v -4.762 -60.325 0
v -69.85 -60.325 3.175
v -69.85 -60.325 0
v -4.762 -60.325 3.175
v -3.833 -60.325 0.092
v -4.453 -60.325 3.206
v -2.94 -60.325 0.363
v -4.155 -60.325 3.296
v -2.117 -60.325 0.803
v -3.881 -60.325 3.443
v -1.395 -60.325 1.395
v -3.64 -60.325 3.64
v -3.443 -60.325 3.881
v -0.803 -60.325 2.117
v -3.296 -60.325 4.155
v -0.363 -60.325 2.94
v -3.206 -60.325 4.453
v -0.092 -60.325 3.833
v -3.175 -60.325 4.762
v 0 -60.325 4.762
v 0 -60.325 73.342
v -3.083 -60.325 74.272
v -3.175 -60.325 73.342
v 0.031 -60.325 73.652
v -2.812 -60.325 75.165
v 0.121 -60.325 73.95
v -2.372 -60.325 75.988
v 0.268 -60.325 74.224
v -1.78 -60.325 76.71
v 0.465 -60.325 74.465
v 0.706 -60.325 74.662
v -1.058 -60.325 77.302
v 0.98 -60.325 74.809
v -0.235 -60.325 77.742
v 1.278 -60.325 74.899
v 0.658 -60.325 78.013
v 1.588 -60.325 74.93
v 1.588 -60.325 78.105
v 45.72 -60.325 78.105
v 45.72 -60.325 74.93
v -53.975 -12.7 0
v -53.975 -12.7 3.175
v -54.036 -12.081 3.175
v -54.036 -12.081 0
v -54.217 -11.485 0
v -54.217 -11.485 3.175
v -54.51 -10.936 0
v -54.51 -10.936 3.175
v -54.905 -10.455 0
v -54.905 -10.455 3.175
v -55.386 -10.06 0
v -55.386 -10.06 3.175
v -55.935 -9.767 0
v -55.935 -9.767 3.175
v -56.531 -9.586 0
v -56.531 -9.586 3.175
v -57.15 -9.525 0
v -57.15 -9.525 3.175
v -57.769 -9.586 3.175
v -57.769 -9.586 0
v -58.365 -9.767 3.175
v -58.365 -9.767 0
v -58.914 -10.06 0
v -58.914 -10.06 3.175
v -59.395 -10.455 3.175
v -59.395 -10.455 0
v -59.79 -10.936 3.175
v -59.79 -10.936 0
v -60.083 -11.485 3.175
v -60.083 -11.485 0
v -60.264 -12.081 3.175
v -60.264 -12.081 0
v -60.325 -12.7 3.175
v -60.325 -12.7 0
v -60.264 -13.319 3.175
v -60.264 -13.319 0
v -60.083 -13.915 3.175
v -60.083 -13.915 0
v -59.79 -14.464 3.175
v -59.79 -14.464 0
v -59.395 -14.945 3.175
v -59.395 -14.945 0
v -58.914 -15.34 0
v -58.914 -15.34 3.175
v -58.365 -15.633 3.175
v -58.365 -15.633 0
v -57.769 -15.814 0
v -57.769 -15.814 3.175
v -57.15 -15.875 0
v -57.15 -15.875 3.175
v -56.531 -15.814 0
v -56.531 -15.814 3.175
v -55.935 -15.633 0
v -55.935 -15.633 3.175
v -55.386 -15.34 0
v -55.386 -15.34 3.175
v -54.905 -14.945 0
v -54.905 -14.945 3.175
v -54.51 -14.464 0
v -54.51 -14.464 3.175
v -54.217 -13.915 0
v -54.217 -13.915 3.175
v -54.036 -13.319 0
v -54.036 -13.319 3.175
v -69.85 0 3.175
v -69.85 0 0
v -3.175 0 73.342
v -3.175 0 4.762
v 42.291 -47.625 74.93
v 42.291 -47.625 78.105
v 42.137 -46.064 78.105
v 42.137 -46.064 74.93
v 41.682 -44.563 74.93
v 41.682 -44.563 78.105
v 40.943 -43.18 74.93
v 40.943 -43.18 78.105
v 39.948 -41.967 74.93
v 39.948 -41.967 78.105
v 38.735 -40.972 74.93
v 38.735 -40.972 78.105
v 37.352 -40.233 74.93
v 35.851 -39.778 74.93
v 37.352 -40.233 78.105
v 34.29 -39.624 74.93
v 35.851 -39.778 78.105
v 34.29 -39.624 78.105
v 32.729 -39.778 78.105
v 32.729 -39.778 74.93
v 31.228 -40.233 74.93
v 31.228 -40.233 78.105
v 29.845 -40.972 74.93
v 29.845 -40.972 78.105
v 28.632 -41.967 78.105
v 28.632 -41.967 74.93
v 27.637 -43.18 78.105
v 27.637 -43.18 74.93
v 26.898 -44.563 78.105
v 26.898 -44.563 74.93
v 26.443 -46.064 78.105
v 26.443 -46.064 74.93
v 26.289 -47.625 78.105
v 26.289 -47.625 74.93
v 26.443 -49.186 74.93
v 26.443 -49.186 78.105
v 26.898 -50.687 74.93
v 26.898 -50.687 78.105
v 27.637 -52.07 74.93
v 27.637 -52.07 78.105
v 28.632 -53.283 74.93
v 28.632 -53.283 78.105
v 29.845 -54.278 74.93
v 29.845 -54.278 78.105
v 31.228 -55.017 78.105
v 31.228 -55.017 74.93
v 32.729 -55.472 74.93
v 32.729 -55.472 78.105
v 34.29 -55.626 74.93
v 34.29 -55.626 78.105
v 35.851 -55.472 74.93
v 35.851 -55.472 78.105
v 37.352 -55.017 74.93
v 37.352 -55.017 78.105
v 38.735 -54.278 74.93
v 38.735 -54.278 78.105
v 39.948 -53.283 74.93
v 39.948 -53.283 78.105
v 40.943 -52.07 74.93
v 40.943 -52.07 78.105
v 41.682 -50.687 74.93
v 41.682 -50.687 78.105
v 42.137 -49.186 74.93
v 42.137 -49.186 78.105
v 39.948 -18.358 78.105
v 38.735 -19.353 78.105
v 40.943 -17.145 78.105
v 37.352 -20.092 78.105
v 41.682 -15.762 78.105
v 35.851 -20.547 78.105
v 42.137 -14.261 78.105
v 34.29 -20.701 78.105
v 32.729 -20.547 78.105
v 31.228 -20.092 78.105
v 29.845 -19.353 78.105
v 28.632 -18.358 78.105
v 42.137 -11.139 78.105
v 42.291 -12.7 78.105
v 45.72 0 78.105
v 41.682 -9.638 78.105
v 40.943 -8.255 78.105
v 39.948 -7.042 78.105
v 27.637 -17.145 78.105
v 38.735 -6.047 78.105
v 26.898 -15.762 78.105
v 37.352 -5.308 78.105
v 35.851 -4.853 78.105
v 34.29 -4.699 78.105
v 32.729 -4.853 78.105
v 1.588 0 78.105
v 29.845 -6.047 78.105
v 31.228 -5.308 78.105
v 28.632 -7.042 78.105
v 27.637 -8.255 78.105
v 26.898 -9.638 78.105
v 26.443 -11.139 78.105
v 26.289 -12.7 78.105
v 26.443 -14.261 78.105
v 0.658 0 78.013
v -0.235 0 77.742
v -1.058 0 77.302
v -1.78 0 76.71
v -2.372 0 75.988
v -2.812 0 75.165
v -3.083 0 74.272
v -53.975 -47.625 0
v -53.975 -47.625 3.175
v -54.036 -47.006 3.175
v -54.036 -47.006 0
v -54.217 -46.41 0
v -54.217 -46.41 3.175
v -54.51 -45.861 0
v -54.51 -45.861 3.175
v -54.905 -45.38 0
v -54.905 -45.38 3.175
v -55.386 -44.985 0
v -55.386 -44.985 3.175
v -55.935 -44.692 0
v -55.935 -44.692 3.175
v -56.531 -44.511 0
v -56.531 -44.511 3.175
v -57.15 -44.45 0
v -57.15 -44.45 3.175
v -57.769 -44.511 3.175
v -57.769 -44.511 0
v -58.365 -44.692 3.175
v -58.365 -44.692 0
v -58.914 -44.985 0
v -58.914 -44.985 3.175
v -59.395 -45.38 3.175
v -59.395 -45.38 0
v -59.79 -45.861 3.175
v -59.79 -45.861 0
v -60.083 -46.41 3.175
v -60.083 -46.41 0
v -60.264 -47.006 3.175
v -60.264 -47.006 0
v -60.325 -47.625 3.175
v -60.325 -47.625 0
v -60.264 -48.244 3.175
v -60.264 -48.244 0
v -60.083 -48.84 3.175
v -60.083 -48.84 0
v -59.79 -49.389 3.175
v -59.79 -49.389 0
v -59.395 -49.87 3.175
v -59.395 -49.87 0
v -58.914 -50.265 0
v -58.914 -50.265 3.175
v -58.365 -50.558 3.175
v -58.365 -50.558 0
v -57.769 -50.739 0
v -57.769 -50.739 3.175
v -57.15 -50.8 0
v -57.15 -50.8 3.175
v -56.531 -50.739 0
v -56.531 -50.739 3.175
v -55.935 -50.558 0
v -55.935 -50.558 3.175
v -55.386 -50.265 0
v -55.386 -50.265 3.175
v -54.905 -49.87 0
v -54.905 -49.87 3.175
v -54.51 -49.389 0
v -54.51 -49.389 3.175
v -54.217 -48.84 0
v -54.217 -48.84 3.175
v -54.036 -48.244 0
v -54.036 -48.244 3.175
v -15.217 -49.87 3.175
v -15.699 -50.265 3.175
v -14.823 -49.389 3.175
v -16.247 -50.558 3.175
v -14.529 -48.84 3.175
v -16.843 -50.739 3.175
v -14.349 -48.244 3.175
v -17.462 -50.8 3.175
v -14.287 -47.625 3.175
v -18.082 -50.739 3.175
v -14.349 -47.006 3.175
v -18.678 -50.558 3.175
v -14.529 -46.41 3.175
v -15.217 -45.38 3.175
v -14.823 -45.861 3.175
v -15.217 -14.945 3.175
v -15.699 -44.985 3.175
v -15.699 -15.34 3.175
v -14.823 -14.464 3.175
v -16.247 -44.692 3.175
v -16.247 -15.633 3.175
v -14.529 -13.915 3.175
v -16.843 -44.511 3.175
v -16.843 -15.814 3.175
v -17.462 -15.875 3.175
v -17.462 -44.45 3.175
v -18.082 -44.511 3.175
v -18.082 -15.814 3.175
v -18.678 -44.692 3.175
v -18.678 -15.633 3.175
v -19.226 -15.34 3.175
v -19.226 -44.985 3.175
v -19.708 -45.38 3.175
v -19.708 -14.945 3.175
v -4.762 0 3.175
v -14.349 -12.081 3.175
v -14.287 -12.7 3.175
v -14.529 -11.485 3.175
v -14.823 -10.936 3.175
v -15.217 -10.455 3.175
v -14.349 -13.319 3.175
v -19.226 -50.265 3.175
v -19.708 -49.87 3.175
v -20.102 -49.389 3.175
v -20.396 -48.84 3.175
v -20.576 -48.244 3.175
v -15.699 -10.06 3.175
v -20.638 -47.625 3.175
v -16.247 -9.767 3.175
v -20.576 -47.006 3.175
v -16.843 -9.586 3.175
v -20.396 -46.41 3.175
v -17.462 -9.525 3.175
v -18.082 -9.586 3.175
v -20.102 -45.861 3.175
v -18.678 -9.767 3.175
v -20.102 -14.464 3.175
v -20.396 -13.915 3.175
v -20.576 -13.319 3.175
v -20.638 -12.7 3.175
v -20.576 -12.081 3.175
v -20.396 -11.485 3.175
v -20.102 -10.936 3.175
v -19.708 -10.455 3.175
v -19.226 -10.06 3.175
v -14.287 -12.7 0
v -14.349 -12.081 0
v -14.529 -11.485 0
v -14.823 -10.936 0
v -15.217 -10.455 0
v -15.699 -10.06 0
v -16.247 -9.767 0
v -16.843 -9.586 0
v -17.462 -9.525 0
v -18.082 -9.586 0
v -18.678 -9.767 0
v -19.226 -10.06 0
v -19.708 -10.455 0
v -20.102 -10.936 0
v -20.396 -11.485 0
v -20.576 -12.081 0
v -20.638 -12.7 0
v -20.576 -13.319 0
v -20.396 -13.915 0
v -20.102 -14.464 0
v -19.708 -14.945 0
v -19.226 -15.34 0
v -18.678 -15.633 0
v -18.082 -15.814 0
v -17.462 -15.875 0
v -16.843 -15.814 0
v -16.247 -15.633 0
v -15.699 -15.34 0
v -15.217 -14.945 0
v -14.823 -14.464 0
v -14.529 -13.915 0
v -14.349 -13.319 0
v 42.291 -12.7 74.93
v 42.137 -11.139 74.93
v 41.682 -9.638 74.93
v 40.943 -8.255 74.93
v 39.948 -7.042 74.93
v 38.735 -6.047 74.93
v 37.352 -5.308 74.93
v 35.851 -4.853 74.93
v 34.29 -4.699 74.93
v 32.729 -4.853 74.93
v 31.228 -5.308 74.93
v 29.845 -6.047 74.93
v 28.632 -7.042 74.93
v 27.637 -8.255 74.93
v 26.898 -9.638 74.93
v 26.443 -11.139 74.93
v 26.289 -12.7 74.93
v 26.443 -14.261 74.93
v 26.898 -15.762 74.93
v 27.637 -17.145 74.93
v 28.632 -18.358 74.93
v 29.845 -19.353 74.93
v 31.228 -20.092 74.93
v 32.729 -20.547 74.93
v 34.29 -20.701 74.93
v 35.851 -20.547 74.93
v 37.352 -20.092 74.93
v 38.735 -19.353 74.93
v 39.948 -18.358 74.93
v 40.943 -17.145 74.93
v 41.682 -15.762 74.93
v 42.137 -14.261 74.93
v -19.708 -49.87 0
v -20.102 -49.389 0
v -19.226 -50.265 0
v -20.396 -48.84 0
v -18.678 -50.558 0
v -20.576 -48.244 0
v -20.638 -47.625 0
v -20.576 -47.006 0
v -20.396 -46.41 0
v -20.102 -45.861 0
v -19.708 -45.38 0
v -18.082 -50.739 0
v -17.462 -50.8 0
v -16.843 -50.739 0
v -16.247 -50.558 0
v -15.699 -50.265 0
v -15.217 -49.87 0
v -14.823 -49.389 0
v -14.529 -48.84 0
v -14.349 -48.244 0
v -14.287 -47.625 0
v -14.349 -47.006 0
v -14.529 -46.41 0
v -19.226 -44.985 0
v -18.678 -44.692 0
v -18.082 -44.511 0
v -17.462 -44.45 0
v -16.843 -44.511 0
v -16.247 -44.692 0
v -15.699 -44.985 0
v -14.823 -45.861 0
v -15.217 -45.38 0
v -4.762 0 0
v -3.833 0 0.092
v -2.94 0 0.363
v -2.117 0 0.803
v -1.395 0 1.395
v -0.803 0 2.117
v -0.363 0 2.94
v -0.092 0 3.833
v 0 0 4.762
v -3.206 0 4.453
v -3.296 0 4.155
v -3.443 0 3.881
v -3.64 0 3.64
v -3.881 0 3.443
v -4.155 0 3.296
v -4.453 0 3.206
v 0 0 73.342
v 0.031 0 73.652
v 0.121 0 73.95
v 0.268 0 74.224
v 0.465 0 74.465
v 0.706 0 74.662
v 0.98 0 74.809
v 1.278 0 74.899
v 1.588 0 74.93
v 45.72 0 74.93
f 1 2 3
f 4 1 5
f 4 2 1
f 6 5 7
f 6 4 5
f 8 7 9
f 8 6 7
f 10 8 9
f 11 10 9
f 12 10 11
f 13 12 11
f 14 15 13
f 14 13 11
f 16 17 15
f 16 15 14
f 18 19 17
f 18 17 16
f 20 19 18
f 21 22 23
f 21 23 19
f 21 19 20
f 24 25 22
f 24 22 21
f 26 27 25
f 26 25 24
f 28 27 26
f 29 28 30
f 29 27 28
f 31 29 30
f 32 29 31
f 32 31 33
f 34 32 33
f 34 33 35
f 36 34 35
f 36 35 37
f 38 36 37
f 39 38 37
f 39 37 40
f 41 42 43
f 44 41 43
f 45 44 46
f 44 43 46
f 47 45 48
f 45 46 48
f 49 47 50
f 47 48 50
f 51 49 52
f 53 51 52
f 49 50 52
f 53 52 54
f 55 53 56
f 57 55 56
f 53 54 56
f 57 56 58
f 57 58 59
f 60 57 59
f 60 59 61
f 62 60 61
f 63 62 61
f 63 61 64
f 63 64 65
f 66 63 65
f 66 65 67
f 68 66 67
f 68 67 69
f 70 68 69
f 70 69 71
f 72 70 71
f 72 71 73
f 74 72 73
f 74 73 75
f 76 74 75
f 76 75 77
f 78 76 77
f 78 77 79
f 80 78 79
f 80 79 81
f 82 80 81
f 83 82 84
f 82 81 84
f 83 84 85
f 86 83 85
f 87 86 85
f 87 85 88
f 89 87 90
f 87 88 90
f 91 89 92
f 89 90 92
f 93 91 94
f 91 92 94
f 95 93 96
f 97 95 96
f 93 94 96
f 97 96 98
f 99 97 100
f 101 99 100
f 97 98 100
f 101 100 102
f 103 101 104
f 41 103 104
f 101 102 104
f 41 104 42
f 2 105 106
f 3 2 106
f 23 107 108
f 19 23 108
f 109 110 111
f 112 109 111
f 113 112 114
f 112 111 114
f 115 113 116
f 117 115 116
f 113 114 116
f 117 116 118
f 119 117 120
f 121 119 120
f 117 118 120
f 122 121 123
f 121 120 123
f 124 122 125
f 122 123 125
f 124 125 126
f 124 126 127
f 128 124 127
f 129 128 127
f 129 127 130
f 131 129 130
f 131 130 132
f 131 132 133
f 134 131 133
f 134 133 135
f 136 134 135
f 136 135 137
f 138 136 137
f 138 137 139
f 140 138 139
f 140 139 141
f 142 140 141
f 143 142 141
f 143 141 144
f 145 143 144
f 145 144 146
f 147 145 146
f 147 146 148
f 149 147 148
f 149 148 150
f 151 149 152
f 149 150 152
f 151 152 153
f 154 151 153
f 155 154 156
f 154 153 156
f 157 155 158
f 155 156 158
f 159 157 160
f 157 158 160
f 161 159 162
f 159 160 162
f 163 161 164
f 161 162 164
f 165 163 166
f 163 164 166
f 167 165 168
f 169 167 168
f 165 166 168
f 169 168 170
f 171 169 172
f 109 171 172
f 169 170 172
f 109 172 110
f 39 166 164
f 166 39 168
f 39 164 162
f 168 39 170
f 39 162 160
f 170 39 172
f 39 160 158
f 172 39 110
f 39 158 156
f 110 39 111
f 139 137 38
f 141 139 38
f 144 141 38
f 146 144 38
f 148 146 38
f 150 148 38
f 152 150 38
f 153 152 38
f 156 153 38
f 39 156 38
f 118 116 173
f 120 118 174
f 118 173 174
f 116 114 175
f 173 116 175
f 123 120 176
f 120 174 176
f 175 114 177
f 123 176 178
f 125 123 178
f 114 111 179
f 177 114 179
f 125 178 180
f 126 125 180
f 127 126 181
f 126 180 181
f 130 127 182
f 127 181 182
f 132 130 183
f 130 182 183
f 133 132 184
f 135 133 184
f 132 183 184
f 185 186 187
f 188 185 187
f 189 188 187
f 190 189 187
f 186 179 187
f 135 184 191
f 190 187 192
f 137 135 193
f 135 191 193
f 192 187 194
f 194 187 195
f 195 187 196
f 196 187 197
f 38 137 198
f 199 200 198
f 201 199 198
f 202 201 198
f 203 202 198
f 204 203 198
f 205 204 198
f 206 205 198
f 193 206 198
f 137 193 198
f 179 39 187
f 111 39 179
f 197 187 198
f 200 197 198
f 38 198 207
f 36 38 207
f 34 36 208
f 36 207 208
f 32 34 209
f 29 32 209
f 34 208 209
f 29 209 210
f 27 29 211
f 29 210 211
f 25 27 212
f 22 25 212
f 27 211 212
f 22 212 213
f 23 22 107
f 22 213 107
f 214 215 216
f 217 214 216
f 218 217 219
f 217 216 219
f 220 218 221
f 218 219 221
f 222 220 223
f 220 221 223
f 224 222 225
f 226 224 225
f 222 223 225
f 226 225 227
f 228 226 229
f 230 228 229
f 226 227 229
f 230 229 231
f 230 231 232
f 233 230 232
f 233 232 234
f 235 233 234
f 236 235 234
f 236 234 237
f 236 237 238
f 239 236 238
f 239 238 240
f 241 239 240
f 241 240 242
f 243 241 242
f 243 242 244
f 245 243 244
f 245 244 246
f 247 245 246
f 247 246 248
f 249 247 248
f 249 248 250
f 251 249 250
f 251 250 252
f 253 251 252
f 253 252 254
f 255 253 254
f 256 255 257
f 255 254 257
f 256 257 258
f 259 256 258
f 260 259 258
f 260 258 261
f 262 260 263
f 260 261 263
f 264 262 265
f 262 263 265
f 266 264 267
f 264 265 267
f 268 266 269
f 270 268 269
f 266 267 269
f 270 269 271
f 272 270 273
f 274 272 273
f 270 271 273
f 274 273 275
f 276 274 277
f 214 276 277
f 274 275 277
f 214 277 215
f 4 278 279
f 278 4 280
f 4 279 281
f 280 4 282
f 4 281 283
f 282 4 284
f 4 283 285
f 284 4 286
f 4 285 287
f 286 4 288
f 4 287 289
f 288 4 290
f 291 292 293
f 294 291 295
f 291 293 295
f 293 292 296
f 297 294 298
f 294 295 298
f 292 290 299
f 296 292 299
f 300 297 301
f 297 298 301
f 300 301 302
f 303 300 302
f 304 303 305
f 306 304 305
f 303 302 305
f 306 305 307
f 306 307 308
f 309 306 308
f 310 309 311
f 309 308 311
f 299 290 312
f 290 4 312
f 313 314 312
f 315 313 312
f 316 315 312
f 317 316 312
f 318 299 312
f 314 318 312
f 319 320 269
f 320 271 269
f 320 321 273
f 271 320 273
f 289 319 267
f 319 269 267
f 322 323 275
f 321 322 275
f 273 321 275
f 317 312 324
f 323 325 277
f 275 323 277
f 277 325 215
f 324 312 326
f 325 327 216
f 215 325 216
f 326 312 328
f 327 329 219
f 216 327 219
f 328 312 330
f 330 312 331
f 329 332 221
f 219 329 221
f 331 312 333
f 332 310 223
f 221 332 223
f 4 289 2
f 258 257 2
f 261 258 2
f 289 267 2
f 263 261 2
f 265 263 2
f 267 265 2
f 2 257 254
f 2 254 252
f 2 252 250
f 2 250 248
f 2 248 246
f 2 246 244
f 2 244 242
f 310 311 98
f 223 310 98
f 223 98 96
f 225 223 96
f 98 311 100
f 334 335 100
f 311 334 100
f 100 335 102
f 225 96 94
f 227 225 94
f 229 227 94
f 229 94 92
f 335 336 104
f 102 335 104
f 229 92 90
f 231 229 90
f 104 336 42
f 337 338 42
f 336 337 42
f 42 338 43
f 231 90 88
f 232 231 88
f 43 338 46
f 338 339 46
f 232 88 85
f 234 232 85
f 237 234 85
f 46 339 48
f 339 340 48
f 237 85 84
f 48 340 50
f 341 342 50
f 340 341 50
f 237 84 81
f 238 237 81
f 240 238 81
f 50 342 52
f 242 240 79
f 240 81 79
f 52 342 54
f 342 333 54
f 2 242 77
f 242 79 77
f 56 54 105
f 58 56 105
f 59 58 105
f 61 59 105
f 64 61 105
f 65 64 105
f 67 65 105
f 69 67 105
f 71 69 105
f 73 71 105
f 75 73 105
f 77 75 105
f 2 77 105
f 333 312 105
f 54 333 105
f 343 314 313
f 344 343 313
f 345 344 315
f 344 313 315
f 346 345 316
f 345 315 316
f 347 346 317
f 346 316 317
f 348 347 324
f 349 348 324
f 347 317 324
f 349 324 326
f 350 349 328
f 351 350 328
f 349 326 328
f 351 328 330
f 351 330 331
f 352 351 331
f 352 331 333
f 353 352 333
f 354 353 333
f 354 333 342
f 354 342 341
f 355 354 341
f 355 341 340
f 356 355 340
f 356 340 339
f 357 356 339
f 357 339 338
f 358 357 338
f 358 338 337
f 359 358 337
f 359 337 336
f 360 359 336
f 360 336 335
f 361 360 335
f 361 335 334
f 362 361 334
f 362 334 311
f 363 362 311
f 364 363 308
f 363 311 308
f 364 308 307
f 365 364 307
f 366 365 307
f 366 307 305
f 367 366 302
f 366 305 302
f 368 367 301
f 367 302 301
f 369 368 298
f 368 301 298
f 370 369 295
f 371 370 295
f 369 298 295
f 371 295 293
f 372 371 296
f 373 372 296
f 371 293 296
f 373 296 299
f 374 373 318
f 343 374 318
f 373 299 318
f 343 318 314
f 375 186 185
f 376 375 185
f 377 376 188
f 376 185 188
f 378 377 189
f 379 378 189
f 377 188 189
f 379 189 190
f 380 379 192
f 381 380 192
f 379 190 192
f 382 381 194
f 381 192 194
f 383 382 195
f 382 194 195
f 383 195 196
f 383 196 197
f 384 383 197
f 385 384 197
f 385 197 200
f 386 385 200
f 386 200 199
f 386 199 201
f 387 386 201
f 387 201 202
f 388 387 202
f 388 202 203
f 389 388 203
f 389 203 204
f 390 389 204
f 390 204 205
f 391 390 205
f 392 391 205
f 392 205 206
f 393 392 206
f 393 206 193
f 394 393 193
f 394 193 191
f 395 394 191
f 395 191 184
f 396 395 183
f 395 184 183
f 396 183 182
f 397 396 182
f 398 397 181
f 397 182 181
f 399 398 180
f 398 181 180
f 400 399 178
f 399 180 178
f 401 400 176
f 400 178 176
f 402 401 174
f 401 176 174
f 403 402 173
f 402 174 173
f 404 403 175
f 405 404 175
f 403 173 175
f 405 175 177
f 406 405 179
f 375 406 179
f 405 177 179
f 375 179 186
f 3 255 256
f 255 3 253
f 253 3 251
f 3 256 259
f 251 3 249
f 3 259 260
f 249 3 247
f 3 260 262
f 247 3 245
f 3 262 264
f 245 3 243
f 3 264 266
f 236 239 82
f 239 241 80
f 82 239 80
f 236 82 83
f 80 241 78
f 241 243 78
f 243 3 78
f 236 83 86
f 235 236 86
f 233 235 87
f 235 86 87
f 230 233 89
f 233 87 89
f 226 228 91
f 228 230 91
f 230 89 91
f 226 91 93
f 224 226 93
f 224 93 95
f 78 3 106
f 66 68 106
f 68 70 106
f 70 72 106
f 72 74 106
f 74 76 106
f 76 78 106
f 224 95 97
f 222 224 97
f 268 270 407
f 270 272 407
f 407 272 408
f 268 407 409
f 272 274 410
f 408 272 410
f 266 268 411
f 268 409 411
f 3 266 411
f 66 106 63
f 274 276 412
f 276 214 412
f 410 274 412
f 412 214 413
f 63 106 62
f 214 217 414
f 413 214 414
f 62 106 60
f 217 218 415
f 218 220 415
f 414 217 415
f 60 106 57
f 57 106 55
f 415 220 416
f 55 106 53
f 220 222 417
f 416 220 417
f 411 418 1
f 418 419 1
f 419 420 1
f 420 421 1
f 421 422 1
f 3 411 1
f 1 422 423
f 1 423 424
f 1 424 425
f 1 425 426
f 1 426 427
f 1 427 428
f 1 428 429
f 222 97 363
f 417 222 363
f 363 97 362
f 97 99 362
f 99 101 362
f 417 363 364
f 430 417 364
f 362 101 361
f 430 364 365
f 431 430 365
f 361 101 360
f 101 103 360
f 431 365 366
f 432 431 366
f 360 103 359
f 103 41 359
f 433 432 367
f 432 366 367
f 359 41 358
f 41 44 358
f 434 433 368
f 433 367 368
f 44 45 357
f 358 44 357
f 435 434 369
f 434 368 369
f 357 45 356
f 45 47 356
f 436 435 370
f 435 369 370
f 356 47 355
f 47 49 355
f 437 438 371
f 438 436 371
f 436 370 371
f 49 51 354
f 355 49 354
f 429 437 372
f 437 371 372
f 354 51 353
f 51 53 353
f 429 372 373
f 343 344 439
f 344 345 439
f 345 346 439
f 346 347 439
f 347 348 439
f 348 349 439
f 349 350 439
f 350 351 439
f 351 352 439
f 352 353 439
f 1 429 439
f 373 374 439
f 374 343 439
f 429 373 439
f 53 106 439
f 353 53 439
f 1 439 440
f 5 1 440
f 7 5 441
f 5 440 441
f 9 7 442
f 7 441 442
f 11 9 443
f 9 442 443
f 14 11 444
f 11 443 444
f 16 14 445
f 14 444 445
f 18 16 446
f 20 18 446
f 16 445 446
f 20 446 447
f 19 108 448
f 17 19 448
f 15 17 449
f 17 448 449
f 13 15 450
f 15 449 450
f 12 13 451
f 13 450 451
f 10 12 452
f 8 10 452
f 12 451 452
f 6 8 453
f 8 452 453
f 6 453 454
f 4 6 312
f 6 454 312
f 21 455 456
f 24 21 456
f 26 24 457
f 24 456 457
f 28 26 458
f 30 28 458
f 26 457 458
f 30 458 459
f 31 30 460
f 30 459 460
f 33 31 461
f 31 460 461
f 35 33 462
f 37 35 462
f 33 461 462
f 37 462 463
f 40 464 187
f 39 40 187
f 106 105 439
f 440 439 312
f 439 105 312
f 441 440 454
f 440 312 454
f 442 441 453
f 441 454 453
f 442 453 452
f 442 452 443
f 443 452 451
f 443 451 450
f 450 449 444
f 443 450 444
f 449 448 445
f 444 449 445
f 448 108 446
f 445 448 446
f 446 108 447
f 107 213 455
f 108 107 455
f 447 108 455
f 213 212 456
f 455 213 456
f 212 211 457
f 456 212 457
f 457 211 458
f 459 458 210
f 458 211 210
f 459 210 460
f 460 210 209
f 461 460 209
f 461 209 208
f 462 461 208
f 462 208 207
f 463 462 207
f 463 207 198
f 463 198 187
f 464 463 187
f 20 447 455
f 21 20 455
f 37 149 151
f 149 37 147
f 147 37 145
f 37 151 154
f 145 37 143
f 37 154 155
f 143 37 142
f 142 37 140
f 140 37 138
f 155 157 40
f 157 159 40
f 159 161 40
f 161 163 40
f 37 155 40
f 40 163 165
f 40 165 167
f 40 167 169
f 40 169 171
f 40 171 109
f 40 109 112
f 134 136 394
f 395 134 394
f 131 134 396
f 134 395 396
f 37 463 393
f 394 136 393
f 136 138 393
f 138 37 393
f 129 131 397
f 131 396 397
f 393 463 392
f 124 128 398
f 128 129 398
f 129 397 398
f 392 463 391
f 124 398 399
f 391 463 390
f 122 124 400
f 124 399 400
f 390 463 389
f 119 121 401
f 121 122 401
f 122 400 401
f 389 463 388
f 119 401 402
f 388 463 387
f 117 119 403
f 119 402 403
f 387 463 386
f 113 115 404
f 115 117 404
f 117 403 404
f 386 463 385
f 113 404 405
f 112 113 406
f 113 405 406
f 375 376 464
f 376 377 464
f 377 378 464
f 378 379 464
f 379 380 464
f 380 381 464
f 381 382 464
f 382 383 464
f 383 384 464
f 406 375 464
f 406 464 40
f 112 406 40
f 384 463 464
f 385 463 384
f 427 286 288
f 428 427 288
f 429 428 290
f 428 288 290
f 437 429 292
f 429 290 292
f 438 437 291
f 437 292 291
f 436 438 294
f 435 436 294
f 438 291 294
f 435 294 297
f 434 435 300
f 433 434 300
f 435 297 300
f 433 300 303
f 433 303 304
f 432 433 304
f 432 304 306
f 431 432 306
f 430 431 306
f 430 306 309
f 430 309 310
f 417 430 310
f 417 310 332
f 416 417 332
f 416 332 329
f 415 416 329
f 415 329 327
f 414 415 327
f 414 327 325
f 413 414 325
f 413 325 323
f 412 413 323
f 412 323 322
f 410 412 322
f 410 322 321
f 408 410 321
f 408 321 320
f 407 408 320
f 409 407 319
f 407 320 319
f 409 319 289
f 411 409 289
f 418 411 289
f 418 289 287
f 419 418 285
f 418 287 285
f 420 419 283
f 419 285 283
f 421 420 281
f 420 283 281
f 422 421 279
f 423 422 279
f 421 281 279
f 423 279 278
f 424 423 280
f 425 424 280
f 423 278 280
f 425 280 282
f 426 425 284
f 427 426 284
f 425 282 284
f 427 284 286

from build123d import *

# Parameters (mm, degrees)
F1_DEPTH = 60.325
F2_R     = 8.001
F3_DEPTH = 25.4
F4_R     = 3.175
F5_DEPTH = 25.4


with BuildPart() as f1:
    # F0 (on Front) → F1 (new body)
    with BuildSketch(Plane.XZ):
        with BuildLine():
            Line((-4.7625, 3.175), (-69.85, 3.175))
            Line((-69.85, 3.175), (-69.85, 0))
            Line((-69.85, 0), (-4.7625, 0))
            ThreePointArc((-4.7625, 0), (-1.394904, 1.394904), (0, 4.7625))
            Line((0, 4.7625), (0, 73.3425))
            ThreePointArc((0, 73.3425), (0.464968, 74.465032), (1.5875, 74.93))
            Line((1.5875, 74.93), (45.72, 74.93))
            Line((45.72, 74.93), (45.72, 78.105))
            Line((45.72, 78.105), (1.5875, 78.105))
            ThreePointArc((1.5875, 78.105), (-1.780096, 76.710096), (-3.175, 73.3425))
            Line((-3.175, 73.3425), (-3.175, 4.7625))
            ThreePointArc((-3.175, 4.7625), (-3.639968, 3.639968), (-4.7625, 3.175))
        make_face()
    extrude(amount=F1_DEPTH)

    # F2 (on face) → F3 (cut)
    with BuildSketch(Plane.XY.offset(78.105)):
        with Locations((34.29, -12.7)):
            Circle(F2_R)
        with Locations((34.29, -47.625)):
            Circle(F2_R)
    extrude(amount=-F3_DEPTH, mode=Mode.SUBTRACT)

    # F4 (on face) → F5 (cut)
    with BuildSketch(Plane.XY.offset(3.175)):
        with Locations((-57.15, -12.7)):
            Circle(F4_R)
        with Locations((-17.4625, -12.7)):
            Circle(F4_R)
        with Locations((-17.4625, -47.625)):
            Circle(F4_R)
        with Locations((-57.15, -47.625)):
            Circle(F4_R)
    extrude(amount=-F5_DEPTH, mode=Mode.SUBTRACT)


solid = f1.part
